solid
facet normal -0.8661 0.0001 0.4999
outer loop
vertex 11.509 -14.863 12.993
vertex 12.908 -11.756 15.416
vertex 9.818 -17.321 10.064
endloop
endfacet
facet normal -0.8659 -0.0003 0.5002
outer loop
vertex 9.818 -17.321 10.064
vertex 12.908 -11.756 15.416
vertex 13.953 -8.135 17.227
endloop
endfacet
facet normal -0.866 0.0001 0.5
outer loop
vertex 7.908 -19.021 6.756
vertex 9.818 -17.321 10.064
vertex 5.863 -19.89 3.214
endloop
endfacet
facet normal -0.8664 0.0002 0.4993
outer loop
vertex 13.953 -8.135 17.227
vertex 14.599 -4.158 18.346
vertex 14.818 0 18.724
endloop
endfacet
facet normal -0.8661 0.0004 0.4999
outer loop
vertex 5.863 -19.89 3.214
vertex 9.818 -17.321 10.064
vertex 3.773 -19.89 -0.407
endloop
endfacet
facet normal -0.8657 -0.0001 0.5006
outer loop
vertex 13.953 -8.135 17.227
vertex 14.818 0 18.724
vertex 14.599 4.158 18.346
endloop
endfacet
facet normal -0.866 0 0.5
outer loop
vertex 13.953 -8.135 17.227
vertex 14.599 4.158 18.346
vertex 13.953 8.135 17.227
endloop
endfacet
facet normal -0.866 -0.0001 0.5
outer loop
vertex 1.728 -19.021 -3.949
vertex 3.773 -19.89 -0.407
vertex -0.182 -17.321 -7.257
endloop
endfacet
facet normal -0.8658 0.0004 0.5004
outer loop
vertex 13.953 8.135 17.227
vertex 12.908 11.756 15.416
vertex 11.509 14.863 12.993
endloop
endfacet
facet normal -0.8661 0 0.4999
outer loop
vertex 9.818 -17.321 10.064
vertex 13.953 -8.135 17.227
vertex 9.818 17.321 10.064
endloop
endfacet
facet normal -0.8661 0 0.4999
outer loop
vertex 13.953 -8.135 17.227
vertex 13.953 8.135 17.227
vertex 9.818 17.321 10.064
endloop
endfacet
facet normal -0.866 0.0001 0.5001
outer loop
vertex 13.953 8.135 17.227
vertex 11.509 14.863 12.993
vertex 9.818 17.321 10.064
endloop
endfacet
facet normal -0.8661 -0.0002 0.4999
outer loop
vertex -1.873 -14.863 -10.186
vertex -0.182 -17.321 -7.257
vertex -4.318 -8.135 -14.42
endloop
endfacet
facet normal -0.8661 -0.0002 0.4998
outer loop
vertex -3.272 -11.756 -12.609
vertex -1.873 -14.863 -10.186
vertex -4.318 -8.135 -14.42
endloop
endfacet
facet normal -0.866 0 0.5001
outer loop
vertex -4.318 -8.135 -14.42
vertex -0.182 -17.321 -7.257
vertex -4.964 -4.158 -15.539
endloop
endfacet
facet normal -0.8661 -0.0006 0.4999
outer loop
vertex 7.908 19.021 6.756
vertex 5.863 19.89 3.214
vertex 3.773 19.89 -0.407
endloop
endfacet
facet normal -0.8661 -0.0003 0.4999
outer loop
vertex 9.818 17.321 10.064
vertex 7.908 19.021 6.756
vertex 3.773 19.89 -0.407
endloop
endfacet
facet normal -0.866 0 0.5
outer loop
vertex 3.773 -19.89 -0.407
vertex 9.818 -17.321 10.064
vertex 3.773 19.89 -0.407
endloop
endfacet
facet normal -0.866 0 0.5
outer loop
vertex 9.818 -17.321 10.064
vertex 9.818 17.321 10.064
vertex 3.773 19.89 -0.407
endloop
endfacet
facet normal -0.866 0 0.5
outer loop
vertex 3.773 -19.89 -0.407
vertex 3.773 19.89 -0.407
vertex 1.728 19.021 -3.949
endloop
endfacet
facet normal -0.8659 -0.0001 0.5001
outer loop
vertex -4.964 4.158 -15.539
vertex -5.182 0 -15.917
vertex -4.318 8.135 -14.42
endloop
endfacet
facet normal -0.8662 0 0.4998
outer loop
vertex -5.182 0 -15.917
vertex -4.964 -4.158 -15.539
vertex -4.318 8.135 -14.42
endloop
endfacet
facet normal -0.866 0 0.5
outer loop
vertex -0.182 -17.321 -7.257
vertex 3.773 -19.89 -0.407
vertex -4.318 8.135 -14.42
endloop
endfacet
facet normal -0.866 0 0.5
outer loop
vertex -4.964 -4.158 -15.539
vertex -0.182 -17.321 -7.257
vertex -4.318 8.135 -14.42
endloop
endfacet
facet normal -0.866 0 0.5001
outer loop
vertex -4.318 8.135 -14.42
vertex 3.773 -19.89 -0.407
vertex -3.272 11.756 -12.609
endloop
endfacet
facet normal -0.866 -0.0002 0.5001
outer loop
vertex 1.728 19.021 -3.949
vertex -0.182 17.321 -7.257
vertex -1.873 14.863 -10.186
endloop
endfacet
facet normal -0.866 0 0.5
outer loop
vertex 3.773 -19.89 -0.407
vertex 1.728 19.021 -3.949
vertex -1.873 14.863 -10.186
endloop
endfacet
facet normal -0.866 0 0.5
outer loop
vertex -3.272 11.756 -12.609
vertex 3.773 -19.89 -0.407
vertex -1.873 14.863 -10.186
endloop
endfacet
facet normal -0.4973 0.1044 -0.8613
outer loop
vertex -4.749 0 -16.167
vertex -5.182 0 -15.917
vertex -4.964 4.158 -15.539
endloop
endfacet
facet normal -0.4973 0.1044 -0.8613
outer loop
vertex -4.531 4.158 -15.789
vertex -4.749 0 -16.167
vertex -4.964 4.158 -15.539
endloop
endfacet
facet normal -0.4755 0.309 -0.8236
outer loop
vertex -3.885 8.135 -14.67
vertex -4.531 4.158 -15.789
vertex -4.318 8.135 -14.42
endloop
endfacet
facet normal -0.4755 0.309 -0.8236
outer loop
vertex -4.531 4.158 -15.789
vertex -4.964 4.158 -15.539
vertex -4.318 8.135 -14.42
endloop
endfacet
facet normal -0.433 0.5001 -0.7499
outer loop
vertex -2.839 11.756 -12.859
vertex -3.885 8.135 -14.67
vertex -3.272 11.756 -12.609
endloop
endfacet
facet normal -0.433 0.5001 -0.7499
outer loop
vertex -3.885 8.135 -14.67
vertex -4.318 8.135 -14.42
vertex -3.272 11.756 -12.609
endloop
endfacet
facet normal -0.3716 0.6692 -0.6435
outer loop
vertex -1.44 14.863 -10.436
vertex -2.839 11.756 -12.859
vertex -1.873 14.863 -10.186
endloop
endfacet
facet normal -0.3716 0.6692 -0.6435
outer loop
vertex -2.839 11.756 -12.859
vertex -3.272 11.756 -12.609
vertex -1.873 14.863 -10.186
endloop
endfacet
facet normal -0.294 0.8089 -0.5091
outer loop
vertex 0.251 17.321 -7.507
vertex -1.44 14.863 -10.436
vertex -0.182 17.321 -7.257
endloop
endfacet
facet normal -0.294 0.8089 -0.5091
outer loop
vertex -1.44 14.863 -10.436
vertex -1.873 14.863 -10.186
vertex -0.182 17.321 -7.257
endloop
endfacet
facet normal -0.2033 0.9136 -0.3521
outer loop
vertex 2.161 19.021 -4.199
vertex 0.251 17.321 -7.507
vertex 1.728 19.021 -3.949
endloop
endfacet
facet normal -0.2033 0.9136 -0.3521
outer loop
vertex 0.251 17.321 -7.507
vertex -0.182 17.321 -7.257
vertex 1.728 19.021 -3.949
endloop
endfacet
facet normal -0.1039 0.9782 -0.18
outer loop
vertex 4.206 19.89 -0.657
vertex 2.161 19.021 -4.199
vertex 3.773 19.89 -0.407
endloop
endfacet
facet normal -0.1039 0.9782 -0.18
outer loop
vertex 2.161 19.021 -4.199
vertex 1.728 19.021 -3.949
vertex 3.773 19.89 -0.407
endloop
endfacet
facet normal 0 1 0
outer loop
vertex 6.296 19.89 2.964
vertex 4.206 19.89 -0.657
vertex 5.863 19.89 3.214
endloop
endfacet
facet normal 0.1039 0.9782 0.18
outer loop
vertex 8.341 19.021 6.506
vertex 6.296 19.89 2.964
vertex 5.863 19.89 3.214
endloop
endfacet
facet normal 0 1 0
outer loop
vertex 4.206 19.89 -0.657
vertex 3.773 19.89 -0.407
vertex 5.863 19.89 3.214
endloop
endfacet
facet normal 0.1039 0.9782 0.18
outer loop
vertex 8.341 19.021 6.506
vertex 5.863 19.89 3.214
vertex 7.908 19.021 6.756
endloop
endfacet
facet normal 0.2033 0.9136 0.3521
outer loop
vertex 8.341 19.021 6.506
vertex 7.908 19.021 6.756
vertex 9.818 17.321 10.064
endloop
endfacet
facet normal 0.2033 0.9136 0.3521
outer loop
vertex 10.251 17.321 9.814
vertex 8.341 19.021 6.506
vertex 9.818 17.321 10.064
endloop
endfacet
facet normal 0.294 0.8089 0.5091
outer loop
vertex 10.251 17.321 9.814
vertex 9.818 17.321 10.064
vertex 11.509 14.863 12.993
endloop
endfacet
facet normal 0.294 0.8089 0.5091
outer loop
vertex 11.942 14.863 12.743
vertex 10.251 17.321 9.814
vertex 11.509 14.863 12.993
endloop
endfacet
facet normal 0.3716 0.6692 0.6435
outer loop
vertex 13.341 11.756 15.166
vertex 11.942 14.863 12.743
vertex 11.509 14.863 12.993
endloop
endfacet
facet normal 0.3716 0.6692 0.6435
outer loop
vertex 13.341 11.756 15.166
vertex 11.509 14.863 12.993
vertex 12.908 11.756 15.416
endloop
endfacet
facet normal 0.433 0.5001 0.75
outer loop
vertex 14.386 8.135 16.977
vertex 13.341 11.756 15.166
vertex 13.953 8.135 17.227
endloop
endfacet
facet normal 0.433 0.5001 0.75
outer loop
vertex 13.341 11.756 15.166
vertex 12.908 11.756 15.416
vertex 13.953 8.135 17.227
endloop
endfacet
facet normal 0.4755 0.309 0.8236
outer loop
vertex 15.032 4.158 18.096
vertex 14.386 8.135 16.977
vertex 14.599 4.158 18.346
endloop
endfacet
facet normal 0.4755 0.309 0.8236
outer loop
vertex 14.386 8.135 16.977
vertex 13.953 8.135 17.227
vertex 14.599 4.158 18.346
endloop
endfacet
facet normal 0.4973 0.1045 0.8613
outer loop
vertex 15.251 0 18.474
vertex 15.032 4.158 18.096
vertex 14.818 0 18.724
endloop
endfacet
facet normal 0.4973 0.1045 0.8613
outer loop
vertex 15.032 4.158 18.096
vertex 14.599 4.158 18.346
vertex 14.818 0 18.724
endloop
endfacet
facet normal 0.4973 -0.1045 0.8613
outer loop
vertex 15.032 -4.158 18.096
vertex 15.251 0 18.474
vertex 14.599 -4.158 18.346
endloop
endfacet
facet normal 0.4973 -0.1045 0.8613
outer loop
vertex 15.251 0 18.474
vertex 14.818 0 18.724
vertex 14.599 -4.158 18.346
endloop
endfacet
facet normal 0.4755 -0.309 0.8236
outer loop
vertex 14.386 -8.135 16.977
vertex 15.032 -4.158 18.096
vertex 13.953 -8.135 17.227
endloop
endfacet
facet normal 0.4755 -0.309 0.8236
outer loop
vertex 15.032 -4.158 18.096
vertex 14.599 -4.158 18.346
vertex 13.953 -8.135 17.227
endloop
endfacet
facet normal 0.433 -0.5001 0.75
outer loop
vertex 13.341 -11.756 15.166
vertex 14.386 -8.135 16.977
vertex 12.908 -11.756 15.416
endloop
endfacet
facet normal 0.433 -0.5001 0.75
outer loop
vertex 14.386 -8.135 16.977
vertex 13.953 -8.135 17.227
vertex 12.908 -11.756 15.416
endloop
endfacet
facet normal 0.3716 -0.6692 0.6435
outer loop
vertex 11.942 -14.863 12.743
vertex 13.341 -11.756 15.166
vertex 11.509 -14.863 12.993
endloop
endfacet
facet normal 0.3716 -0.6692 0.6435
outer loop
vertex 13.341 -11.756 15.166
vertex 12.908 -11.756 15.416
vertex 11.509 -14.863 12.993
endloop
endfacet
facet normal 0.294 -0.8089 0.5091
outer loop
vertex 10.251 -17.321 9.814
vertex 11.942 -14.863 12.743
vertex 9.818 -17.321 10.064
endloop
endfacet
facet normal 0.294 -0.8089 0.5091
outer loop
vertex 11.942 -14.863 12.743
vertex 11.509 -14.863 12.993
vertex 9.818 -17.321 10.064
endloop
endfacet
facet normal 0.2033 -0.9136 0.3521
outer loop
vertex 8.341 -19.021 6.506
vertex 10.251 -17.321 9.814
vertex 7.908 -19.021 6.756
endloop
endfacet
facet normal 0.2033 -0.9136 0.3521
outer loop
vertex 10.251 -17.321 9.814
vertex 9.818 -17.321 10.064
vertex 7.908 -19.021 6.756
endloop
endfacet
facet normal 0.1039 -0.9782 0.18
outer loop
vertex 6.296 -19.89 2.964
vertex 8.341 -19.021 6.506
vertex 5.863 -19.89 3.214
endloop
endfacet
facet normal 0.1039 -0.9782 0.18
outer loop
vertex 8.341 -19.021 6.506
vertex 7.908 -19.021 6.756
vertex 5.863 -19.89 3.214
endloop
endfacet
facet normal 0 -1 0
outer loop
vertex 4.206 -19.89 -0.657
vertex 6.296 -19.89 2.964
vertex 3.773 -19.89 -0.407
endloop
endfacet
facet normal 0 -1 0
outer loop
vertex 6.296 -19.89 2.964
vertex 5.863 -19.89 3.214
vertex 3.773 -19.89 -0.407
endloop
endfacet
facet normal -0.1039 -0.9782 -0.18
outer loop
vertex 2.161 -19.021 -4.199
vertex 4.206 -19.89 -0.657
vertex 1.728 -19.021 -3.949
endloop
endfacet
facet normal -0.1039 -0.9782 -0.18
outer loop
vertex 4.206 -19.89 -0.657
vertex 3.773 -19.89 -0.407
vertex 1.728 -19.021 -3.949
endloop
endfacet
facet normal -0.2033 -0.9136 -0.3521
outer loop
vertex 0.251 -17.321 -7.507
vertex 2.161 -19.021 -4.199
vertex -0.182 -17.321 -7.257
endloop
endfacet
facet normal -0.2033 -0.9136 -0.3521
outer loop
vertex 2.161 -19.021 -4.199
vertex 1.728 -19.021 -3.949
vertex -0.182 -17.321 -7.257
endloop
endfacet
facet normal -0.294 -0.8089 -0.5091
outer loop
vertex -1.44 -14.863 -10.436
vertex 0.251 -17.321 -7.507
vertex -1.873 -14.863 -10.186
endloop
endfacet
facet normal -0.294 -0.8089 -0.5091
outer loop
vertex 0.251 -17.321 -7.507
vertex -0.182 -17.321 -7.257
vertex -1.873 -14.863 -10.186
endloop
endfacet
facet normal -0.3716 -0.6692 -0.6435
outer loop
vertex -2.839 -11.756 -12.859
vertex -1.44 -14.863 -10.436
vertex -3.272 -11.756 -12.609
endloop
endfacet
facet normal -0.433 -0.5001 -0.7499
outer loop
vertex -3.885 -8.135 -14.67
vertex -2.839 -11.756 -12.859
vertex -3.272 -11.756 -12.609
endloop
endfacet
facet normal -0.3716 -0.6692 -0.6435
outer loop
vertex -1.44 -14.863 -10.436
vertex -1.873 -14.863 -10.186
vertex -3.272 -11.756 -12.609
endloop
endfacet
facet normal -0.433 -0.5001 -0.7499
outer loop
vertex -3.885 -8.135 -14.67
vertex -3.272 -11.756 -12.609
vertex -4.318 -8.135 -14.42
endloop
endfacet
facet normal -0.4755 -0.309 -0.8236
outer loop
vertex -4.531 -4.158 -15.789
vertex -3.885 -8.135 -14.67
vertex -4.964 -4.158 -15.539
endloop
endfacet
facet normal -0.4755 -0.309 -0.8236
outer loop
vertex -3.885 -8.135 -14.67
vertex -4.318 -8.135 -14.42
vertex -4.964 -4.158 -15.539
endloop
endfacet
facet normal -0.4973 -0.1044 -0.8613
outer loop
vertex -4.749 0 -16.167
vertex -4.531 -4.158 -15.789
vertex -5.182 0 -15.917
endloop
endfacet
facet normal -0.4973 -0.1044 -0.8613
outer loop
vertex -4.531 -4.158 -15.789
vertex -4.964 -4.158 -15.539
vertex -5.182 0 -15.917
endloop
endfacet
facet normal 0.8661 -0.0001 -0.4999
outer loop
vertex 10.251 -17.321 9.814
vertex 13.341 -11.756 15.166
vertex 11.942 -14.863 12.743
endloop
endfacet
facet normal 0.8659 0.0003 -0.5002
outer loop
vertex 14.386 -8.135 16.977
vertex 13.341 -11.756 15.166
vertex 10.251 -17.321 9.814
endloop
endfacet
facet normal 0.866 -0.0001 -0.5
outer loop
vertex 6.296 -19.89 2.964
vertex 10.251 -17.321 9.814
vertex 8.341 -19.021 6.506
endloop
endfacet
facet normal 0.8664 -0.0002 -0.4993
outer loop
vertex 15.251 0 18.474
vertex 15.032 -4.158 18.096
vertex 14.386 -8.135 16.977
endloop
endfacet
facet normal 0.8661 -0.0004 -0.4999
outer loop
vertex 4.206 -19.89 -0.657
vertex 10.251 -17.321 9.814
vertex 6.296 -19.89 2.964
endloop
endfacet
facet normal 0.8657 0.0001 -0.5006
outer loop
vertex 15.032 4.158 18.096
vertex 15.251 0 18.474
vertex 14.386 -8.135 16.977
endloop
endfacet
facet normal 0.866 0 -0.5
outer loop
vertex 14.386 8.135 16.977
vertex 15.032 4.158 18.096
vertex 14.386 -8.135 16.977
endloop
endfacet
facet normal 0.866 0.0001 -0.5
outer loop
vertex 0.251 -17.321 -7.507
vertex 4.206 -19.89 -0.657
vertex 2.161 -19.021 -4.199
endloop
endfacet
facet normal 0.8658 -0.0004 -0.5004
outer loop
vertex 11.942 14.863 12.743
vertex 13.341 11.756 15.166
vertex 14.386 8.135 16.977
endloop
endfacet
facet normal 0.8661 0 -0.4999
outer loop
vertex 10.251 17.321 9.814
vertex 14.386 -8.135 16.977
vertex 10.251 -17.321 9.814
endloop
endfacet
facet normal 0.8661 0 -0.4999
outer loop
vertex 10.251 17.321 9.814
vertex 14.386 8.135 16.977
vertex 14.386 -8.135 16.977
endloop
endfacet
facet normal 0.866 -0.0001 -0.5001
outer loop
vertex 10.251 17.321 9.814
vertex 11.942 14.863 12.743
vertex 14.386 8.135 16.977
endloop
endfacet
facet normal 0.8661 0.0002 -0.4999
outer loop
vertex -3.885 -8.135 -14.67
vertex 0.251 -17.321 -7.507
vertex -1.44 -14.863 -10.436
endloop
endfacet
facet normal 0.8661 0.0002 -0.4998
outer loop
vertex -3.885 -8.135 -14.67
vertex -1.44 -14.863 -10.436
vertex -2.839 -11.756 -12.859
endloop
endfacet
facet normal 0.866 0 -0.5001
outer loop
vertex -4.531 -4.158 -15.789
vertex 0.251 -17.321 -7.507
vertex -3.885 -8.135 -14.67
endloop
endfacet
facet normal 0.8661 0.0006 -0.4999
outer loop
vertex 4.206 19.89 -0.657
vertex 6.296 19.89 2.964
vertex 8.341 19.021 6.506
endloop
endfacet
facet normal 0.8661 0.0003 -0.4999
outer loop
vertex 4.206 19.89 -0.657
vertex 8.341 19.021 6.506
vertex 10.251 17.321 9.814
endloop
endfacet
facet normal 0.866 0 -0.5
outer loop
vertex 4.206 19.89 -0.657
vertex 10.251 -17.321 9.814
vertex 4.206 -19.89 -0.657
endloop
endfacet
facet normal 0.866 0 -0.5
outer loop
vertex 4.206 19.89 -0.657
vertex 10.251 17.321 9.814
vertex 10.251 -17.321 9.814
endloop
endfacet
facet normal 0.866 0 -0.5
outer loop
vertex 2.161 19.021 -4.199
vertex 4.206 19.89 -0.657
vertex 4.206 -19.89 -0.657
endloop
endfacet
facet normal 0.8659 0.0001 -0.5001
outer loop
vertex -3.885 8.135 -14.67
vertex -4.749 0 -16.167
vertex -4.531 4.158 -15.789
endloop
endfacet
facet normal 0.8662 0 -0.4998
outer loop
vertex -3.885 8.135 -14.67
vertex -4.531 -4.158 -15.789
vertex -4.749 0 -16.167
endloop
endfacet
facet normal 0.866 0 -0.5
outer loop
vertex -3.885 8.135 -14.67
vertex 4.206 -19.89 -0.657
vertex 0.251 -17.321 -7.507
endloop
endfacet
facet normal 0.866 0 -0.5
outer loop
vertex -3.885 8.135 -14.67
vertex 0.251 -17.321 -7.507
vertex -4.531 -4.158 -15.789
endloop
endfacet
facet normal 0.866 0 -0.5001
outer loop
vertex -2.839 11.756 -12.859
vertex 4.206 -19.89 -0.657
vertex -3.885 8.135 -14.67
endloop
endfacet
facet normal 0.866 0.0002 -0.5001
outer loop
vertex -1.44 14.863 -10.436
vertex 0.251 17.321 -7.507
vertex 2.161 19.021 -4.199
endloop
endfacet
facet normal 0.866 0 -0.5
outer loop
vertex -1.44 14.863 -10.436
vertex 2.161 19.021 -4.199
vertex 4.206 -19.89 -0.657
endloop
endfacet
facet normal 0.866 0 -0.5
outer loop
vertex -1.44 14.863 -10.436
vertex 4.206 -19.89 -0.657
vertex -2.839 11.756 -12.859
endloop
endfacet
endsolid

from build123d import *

# Parameters (mm, degrees)
SKETCH1_R             = 40
BOSS_EXTRUDE1_DEPTH   = 1
SCALE1_SCALE          = 0.5
BODY_MOVE_COPY3_ANGLE = 30


with BuildPart() as part:
    # Sketch1 → Boss-Extrude1 (new body)
    with BuildSketch(Plane(origin=(0, 0, 0), x_dir=(0, 0, -1), z_dir=(1, 0, 0))):
        Circle(SKETCH1_R)
    extrude(amount=BOSS_EXTRUDE1_DEPTH)


with BuildPart() as part_1:
    # Scale1: scaled about (0.5, 0, 0)
    add(part.part.scale(SCALE1_SCALE).moved(Location((0.25, 0, 0))))


with BuildPart() as part_2:
    # Body-Move/Copy2: moved
    add(part_1.part.moved(Location((4.171055646, 0, 0))))


with BuildPart() as part_3:
    # Body-Move/Copy3: moved
    add(part_2.part.rotate(Axis((7.238444841, 0, -0.038800486), (0, 1, 0)), BODY_MOVE_COPY3_ANGLE))


solid = part_3.part
